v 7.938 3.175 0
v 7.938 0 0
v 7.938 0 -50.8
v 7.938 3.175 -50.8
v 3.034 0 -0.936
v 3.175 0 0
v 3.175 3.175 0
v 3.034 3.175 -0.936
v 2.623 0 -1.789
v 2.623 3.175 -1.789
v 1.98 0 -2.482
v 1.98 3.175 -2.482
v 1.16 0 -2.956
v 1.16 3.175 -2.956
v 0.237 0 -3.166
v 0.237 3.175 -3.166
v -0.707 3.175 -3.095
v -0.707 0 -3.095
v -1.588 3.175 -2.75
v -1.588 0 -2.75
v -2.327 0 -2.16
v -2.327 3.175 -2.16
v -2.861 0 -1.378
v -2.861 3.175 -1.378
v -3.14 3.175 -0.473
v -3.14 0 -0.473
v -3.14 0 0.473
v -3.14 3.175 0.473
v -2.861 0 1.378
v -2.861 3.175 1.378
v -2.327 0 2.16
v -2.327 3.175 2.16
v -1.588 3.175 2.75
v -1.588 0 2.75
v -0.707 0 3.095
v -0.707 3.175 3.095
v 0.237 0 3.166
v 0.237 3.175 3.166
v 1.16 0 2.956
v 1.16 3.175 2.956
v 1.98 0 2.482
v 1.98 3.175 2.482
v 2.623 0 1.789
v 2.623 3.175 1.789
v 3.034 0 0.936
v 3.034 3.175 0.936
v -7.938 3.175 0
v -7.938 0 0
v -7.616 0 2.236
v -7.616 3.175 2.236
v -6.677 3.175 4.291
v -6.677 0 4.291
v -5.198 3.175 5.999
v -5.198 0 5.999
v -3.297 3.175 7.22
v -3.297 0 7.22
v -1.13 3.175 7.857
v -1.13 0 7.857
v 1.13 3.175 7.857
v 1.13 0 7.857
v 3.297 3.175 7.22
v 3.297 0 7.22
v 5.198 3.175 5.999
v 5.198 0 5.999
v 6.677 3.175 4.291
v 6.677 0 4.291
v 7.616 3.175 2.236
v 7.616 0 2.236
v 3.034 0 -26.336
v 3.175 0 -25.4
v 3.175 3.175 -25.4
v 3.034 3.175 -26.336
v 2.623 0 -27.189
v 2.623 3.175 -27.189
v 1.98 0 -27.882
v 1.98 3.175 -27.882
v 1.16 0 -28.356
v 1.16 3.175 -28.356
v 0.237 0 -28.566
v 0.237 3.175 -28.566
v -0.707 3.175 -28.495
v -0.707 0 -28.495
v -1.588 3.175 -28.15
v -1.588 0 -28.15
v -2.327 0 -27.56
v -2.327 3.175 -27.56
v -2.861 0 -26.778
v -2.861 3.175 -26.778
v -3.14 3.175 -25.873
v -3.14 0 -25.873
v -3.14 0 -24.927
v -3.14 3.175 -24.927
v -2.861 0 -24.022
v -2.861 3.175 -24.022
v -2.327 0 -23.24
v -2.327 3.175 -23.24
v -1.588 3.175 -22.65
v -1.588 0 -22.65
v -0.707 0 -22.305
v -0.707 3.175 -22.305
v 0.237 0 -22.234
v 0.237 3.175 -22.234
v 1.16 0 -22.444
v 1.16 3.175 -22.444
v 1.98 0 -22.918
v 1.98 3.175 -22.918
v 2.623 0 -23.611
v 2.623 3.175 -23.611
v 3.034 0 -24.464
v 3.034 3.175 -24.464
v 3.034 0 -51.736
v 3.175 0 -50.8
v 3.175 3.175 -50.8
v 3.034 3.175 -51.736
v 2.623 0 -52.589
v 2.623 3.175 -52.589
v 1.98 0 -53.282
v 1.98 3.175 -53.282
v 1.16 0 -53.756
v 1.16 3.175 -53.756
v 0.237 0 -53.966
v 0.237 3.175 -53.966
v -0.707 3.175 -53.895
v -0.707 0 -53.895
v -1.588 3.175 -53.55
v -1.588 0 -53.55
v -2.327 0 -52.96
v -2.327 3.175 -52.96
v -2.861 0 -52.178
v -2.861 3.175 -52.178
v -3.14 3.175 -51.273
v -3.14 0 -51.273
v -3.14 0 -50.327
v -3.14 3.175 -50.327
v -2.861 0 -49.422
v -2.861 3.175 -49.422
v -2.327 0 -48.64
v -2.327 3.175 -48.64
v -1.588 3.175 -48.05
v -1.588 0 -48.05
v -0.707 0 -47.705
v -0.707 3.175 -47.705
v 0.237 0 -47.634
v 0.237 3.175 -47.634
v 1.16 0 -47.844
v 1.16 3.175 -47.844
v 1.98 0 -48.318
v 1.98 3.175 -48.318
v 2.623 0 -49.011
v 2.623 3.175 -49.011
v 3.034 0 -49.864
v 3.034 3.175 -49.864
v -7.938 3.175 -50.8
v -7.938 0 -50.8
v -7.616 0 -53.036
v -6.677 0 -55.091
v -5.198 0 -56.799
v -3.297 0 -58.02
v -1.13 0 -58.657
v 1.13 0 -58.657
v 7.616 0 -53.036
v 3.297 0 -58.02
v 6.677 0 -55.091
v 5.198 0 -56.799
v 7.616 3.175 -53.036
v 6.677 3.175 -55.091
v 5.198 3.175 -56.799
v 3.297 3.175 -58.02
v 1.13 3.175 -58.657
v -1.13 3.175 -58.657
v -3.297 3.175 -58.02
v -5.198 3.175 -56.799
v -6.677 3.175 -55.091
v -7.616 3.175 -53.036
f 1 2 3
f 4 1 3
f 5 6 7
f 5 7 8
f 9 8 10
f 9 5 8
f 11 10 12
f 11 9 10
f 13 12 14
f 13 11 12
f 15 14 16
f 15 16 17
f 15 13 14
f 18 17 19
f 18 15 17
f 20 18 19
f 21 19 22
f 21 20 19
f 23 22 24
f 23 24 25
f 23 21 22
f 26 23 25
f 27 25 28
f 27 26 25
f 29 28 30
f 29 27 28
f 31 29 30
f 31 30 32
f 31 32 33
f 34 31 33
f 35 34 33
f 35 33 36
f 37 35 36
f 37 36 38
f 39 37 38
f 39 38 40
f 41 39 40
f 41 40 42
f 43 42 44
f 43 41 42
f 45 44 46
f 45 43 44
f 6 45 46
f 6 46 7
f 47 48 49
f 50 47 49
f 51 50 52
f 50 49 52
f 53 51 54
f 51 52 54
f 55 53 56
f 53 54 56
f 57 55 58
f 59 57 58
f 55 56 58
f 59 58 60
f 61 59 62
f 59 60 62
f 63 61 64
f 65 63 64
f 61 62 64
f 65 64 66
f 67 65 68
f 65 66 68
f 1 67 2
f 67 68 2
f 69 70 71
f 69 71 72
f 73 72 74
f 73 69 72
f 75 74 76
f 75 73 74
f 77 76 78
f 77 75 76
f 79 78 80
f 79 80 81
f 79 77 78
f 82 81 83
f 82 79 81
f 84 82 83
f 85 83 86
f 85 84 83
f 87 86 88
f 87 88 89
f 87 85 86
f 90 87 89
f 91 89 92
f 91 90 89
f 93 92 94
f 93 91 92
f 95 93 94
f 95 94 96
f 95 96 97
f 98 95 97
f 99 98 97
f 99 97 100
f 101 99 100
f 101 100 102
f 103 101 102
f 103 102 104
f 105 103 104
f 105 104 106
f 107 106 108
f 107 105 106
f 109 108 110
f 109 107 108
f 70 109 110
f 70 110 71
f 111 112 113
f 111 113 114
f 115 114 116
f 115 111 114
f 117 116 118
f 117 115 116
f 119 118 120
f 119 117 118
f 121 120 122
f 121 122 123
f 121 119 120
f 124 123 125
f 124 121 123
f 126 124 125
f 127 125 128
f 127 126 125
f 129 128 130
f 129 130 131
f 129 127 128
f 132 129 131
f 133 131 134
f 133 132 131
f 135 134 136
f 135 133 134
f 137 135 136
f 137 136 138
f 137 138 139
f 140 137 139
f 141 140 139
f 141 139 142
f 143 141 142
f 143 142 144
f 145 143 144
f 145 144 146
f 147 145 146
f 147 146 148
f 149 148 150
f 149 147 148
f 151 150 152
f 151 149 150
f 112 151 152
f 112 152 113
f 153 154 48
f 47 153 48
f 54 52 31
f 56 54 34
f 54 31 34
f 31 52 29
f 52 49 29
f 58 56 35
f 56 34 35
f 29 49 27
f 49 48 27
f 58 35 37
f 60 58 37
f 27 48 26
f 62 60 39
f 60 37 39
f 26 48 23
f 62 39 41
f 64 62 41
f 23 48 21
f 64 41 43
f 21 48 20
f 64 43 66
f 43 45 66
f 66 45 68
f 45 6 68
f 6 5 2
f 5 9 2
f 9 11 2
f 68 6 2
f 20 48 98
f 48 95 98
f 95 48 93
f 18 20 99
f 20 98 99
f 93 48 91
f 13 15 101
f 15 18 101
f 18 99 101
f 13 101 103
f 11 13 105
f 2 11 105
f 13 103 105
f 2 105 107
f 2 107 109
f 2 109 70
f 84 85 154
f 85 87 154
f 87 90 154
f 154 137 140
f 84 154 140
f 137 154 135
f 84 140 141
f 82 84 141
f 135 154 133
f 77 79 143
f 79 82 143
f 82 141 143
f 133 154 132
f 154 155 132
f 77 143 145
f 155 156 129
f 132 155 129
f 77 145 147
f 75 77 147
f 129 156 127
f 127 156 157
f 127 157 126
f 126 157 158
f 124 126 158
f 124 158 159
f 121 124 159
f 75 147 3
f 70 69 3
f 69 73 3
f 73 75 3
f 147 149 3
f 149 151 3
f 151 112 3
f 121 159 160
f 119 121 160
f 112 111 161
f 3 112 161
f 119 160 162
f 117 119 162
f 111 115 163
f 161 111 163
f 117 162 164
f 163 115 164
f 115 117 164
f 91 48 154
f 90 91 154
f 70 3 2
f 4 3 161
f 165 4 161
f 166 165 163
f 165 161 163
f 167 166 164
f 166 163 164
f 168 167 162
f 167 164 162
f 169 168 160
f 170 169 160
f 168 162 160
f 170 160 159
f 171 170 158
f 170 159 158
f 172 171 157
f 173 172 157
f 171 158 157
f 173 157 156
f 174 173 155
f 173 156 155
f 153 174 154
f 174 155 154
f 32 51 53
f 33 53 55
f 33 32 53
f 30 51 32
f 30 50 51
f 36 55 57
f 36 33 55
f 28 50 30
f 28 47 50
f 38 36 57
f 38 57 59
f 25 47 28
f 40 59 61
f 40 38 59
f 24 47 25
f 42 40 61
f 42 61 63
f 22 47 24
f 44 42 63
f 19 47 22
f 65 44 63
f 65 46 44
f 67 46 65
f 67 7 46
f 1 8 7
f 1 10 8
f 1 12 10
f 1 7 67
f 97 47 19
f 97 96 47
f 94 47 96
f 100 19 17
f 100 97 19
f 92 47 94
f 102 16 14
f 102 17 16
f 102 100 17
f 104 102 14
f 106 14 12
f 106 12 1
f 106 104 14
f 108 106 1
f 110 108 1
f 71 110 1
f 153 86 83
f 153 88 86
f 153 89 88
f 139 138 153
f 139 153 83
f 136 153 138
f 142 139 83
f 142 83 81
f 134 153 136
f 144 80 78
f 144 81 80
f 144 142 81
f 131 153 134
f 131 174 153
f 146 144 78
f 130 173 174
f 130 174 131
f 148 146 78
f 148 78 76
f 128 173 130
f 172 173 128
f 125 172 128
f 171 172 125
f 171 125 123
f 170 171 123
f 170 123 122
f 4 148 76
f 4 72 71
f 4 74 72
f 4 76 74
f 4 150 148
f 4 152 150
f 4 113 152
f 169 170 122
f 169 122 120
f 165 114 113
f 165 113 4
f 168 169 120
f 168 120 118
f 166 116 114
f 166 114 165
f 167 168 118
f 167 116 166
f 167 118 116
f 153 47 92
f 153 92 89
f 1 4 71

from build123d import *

# Parameters (mm, degrees)
SKETCH1_R           = 3.175
BOSS_EXTRUDE1_DEPTH = 3.175


with BuildPart() as part:
    # Sketch1 → Boss-Extrude1 (new body)
    with BuildSketch(Plane(origin=(0, 0, 0), x_dir=(1, 0, 0), z_dir=(0, 1, 0))):
        with BuildLine():
            ThreePointArc((7.9375, 50.8), (0, 58.7375), (-7.9375, 50.8))
            Line((-7.9375, 50.8), (-7.9375, 0))
            ThreePointArc((-7.9375, 0), (0, -7.9375), (7.9375, 0))
            Line((7.9375, 0), (7.9375, 50.8))
        make_face()
        with Locations((0, 50.8)):
            Circle(SKETCH1_R, mode=Mode.SUBTRACT)
        with Locations((0, 25.4)):
            Circle(SKETCH1_R, mode=Mode.SUBTRACT)
        Circle(SKETCH1_R, mode=Mode.SUBTRACT)
    extrude(amount=BOSS_EXTRUDE1_DEPTH)


solid = part.part
